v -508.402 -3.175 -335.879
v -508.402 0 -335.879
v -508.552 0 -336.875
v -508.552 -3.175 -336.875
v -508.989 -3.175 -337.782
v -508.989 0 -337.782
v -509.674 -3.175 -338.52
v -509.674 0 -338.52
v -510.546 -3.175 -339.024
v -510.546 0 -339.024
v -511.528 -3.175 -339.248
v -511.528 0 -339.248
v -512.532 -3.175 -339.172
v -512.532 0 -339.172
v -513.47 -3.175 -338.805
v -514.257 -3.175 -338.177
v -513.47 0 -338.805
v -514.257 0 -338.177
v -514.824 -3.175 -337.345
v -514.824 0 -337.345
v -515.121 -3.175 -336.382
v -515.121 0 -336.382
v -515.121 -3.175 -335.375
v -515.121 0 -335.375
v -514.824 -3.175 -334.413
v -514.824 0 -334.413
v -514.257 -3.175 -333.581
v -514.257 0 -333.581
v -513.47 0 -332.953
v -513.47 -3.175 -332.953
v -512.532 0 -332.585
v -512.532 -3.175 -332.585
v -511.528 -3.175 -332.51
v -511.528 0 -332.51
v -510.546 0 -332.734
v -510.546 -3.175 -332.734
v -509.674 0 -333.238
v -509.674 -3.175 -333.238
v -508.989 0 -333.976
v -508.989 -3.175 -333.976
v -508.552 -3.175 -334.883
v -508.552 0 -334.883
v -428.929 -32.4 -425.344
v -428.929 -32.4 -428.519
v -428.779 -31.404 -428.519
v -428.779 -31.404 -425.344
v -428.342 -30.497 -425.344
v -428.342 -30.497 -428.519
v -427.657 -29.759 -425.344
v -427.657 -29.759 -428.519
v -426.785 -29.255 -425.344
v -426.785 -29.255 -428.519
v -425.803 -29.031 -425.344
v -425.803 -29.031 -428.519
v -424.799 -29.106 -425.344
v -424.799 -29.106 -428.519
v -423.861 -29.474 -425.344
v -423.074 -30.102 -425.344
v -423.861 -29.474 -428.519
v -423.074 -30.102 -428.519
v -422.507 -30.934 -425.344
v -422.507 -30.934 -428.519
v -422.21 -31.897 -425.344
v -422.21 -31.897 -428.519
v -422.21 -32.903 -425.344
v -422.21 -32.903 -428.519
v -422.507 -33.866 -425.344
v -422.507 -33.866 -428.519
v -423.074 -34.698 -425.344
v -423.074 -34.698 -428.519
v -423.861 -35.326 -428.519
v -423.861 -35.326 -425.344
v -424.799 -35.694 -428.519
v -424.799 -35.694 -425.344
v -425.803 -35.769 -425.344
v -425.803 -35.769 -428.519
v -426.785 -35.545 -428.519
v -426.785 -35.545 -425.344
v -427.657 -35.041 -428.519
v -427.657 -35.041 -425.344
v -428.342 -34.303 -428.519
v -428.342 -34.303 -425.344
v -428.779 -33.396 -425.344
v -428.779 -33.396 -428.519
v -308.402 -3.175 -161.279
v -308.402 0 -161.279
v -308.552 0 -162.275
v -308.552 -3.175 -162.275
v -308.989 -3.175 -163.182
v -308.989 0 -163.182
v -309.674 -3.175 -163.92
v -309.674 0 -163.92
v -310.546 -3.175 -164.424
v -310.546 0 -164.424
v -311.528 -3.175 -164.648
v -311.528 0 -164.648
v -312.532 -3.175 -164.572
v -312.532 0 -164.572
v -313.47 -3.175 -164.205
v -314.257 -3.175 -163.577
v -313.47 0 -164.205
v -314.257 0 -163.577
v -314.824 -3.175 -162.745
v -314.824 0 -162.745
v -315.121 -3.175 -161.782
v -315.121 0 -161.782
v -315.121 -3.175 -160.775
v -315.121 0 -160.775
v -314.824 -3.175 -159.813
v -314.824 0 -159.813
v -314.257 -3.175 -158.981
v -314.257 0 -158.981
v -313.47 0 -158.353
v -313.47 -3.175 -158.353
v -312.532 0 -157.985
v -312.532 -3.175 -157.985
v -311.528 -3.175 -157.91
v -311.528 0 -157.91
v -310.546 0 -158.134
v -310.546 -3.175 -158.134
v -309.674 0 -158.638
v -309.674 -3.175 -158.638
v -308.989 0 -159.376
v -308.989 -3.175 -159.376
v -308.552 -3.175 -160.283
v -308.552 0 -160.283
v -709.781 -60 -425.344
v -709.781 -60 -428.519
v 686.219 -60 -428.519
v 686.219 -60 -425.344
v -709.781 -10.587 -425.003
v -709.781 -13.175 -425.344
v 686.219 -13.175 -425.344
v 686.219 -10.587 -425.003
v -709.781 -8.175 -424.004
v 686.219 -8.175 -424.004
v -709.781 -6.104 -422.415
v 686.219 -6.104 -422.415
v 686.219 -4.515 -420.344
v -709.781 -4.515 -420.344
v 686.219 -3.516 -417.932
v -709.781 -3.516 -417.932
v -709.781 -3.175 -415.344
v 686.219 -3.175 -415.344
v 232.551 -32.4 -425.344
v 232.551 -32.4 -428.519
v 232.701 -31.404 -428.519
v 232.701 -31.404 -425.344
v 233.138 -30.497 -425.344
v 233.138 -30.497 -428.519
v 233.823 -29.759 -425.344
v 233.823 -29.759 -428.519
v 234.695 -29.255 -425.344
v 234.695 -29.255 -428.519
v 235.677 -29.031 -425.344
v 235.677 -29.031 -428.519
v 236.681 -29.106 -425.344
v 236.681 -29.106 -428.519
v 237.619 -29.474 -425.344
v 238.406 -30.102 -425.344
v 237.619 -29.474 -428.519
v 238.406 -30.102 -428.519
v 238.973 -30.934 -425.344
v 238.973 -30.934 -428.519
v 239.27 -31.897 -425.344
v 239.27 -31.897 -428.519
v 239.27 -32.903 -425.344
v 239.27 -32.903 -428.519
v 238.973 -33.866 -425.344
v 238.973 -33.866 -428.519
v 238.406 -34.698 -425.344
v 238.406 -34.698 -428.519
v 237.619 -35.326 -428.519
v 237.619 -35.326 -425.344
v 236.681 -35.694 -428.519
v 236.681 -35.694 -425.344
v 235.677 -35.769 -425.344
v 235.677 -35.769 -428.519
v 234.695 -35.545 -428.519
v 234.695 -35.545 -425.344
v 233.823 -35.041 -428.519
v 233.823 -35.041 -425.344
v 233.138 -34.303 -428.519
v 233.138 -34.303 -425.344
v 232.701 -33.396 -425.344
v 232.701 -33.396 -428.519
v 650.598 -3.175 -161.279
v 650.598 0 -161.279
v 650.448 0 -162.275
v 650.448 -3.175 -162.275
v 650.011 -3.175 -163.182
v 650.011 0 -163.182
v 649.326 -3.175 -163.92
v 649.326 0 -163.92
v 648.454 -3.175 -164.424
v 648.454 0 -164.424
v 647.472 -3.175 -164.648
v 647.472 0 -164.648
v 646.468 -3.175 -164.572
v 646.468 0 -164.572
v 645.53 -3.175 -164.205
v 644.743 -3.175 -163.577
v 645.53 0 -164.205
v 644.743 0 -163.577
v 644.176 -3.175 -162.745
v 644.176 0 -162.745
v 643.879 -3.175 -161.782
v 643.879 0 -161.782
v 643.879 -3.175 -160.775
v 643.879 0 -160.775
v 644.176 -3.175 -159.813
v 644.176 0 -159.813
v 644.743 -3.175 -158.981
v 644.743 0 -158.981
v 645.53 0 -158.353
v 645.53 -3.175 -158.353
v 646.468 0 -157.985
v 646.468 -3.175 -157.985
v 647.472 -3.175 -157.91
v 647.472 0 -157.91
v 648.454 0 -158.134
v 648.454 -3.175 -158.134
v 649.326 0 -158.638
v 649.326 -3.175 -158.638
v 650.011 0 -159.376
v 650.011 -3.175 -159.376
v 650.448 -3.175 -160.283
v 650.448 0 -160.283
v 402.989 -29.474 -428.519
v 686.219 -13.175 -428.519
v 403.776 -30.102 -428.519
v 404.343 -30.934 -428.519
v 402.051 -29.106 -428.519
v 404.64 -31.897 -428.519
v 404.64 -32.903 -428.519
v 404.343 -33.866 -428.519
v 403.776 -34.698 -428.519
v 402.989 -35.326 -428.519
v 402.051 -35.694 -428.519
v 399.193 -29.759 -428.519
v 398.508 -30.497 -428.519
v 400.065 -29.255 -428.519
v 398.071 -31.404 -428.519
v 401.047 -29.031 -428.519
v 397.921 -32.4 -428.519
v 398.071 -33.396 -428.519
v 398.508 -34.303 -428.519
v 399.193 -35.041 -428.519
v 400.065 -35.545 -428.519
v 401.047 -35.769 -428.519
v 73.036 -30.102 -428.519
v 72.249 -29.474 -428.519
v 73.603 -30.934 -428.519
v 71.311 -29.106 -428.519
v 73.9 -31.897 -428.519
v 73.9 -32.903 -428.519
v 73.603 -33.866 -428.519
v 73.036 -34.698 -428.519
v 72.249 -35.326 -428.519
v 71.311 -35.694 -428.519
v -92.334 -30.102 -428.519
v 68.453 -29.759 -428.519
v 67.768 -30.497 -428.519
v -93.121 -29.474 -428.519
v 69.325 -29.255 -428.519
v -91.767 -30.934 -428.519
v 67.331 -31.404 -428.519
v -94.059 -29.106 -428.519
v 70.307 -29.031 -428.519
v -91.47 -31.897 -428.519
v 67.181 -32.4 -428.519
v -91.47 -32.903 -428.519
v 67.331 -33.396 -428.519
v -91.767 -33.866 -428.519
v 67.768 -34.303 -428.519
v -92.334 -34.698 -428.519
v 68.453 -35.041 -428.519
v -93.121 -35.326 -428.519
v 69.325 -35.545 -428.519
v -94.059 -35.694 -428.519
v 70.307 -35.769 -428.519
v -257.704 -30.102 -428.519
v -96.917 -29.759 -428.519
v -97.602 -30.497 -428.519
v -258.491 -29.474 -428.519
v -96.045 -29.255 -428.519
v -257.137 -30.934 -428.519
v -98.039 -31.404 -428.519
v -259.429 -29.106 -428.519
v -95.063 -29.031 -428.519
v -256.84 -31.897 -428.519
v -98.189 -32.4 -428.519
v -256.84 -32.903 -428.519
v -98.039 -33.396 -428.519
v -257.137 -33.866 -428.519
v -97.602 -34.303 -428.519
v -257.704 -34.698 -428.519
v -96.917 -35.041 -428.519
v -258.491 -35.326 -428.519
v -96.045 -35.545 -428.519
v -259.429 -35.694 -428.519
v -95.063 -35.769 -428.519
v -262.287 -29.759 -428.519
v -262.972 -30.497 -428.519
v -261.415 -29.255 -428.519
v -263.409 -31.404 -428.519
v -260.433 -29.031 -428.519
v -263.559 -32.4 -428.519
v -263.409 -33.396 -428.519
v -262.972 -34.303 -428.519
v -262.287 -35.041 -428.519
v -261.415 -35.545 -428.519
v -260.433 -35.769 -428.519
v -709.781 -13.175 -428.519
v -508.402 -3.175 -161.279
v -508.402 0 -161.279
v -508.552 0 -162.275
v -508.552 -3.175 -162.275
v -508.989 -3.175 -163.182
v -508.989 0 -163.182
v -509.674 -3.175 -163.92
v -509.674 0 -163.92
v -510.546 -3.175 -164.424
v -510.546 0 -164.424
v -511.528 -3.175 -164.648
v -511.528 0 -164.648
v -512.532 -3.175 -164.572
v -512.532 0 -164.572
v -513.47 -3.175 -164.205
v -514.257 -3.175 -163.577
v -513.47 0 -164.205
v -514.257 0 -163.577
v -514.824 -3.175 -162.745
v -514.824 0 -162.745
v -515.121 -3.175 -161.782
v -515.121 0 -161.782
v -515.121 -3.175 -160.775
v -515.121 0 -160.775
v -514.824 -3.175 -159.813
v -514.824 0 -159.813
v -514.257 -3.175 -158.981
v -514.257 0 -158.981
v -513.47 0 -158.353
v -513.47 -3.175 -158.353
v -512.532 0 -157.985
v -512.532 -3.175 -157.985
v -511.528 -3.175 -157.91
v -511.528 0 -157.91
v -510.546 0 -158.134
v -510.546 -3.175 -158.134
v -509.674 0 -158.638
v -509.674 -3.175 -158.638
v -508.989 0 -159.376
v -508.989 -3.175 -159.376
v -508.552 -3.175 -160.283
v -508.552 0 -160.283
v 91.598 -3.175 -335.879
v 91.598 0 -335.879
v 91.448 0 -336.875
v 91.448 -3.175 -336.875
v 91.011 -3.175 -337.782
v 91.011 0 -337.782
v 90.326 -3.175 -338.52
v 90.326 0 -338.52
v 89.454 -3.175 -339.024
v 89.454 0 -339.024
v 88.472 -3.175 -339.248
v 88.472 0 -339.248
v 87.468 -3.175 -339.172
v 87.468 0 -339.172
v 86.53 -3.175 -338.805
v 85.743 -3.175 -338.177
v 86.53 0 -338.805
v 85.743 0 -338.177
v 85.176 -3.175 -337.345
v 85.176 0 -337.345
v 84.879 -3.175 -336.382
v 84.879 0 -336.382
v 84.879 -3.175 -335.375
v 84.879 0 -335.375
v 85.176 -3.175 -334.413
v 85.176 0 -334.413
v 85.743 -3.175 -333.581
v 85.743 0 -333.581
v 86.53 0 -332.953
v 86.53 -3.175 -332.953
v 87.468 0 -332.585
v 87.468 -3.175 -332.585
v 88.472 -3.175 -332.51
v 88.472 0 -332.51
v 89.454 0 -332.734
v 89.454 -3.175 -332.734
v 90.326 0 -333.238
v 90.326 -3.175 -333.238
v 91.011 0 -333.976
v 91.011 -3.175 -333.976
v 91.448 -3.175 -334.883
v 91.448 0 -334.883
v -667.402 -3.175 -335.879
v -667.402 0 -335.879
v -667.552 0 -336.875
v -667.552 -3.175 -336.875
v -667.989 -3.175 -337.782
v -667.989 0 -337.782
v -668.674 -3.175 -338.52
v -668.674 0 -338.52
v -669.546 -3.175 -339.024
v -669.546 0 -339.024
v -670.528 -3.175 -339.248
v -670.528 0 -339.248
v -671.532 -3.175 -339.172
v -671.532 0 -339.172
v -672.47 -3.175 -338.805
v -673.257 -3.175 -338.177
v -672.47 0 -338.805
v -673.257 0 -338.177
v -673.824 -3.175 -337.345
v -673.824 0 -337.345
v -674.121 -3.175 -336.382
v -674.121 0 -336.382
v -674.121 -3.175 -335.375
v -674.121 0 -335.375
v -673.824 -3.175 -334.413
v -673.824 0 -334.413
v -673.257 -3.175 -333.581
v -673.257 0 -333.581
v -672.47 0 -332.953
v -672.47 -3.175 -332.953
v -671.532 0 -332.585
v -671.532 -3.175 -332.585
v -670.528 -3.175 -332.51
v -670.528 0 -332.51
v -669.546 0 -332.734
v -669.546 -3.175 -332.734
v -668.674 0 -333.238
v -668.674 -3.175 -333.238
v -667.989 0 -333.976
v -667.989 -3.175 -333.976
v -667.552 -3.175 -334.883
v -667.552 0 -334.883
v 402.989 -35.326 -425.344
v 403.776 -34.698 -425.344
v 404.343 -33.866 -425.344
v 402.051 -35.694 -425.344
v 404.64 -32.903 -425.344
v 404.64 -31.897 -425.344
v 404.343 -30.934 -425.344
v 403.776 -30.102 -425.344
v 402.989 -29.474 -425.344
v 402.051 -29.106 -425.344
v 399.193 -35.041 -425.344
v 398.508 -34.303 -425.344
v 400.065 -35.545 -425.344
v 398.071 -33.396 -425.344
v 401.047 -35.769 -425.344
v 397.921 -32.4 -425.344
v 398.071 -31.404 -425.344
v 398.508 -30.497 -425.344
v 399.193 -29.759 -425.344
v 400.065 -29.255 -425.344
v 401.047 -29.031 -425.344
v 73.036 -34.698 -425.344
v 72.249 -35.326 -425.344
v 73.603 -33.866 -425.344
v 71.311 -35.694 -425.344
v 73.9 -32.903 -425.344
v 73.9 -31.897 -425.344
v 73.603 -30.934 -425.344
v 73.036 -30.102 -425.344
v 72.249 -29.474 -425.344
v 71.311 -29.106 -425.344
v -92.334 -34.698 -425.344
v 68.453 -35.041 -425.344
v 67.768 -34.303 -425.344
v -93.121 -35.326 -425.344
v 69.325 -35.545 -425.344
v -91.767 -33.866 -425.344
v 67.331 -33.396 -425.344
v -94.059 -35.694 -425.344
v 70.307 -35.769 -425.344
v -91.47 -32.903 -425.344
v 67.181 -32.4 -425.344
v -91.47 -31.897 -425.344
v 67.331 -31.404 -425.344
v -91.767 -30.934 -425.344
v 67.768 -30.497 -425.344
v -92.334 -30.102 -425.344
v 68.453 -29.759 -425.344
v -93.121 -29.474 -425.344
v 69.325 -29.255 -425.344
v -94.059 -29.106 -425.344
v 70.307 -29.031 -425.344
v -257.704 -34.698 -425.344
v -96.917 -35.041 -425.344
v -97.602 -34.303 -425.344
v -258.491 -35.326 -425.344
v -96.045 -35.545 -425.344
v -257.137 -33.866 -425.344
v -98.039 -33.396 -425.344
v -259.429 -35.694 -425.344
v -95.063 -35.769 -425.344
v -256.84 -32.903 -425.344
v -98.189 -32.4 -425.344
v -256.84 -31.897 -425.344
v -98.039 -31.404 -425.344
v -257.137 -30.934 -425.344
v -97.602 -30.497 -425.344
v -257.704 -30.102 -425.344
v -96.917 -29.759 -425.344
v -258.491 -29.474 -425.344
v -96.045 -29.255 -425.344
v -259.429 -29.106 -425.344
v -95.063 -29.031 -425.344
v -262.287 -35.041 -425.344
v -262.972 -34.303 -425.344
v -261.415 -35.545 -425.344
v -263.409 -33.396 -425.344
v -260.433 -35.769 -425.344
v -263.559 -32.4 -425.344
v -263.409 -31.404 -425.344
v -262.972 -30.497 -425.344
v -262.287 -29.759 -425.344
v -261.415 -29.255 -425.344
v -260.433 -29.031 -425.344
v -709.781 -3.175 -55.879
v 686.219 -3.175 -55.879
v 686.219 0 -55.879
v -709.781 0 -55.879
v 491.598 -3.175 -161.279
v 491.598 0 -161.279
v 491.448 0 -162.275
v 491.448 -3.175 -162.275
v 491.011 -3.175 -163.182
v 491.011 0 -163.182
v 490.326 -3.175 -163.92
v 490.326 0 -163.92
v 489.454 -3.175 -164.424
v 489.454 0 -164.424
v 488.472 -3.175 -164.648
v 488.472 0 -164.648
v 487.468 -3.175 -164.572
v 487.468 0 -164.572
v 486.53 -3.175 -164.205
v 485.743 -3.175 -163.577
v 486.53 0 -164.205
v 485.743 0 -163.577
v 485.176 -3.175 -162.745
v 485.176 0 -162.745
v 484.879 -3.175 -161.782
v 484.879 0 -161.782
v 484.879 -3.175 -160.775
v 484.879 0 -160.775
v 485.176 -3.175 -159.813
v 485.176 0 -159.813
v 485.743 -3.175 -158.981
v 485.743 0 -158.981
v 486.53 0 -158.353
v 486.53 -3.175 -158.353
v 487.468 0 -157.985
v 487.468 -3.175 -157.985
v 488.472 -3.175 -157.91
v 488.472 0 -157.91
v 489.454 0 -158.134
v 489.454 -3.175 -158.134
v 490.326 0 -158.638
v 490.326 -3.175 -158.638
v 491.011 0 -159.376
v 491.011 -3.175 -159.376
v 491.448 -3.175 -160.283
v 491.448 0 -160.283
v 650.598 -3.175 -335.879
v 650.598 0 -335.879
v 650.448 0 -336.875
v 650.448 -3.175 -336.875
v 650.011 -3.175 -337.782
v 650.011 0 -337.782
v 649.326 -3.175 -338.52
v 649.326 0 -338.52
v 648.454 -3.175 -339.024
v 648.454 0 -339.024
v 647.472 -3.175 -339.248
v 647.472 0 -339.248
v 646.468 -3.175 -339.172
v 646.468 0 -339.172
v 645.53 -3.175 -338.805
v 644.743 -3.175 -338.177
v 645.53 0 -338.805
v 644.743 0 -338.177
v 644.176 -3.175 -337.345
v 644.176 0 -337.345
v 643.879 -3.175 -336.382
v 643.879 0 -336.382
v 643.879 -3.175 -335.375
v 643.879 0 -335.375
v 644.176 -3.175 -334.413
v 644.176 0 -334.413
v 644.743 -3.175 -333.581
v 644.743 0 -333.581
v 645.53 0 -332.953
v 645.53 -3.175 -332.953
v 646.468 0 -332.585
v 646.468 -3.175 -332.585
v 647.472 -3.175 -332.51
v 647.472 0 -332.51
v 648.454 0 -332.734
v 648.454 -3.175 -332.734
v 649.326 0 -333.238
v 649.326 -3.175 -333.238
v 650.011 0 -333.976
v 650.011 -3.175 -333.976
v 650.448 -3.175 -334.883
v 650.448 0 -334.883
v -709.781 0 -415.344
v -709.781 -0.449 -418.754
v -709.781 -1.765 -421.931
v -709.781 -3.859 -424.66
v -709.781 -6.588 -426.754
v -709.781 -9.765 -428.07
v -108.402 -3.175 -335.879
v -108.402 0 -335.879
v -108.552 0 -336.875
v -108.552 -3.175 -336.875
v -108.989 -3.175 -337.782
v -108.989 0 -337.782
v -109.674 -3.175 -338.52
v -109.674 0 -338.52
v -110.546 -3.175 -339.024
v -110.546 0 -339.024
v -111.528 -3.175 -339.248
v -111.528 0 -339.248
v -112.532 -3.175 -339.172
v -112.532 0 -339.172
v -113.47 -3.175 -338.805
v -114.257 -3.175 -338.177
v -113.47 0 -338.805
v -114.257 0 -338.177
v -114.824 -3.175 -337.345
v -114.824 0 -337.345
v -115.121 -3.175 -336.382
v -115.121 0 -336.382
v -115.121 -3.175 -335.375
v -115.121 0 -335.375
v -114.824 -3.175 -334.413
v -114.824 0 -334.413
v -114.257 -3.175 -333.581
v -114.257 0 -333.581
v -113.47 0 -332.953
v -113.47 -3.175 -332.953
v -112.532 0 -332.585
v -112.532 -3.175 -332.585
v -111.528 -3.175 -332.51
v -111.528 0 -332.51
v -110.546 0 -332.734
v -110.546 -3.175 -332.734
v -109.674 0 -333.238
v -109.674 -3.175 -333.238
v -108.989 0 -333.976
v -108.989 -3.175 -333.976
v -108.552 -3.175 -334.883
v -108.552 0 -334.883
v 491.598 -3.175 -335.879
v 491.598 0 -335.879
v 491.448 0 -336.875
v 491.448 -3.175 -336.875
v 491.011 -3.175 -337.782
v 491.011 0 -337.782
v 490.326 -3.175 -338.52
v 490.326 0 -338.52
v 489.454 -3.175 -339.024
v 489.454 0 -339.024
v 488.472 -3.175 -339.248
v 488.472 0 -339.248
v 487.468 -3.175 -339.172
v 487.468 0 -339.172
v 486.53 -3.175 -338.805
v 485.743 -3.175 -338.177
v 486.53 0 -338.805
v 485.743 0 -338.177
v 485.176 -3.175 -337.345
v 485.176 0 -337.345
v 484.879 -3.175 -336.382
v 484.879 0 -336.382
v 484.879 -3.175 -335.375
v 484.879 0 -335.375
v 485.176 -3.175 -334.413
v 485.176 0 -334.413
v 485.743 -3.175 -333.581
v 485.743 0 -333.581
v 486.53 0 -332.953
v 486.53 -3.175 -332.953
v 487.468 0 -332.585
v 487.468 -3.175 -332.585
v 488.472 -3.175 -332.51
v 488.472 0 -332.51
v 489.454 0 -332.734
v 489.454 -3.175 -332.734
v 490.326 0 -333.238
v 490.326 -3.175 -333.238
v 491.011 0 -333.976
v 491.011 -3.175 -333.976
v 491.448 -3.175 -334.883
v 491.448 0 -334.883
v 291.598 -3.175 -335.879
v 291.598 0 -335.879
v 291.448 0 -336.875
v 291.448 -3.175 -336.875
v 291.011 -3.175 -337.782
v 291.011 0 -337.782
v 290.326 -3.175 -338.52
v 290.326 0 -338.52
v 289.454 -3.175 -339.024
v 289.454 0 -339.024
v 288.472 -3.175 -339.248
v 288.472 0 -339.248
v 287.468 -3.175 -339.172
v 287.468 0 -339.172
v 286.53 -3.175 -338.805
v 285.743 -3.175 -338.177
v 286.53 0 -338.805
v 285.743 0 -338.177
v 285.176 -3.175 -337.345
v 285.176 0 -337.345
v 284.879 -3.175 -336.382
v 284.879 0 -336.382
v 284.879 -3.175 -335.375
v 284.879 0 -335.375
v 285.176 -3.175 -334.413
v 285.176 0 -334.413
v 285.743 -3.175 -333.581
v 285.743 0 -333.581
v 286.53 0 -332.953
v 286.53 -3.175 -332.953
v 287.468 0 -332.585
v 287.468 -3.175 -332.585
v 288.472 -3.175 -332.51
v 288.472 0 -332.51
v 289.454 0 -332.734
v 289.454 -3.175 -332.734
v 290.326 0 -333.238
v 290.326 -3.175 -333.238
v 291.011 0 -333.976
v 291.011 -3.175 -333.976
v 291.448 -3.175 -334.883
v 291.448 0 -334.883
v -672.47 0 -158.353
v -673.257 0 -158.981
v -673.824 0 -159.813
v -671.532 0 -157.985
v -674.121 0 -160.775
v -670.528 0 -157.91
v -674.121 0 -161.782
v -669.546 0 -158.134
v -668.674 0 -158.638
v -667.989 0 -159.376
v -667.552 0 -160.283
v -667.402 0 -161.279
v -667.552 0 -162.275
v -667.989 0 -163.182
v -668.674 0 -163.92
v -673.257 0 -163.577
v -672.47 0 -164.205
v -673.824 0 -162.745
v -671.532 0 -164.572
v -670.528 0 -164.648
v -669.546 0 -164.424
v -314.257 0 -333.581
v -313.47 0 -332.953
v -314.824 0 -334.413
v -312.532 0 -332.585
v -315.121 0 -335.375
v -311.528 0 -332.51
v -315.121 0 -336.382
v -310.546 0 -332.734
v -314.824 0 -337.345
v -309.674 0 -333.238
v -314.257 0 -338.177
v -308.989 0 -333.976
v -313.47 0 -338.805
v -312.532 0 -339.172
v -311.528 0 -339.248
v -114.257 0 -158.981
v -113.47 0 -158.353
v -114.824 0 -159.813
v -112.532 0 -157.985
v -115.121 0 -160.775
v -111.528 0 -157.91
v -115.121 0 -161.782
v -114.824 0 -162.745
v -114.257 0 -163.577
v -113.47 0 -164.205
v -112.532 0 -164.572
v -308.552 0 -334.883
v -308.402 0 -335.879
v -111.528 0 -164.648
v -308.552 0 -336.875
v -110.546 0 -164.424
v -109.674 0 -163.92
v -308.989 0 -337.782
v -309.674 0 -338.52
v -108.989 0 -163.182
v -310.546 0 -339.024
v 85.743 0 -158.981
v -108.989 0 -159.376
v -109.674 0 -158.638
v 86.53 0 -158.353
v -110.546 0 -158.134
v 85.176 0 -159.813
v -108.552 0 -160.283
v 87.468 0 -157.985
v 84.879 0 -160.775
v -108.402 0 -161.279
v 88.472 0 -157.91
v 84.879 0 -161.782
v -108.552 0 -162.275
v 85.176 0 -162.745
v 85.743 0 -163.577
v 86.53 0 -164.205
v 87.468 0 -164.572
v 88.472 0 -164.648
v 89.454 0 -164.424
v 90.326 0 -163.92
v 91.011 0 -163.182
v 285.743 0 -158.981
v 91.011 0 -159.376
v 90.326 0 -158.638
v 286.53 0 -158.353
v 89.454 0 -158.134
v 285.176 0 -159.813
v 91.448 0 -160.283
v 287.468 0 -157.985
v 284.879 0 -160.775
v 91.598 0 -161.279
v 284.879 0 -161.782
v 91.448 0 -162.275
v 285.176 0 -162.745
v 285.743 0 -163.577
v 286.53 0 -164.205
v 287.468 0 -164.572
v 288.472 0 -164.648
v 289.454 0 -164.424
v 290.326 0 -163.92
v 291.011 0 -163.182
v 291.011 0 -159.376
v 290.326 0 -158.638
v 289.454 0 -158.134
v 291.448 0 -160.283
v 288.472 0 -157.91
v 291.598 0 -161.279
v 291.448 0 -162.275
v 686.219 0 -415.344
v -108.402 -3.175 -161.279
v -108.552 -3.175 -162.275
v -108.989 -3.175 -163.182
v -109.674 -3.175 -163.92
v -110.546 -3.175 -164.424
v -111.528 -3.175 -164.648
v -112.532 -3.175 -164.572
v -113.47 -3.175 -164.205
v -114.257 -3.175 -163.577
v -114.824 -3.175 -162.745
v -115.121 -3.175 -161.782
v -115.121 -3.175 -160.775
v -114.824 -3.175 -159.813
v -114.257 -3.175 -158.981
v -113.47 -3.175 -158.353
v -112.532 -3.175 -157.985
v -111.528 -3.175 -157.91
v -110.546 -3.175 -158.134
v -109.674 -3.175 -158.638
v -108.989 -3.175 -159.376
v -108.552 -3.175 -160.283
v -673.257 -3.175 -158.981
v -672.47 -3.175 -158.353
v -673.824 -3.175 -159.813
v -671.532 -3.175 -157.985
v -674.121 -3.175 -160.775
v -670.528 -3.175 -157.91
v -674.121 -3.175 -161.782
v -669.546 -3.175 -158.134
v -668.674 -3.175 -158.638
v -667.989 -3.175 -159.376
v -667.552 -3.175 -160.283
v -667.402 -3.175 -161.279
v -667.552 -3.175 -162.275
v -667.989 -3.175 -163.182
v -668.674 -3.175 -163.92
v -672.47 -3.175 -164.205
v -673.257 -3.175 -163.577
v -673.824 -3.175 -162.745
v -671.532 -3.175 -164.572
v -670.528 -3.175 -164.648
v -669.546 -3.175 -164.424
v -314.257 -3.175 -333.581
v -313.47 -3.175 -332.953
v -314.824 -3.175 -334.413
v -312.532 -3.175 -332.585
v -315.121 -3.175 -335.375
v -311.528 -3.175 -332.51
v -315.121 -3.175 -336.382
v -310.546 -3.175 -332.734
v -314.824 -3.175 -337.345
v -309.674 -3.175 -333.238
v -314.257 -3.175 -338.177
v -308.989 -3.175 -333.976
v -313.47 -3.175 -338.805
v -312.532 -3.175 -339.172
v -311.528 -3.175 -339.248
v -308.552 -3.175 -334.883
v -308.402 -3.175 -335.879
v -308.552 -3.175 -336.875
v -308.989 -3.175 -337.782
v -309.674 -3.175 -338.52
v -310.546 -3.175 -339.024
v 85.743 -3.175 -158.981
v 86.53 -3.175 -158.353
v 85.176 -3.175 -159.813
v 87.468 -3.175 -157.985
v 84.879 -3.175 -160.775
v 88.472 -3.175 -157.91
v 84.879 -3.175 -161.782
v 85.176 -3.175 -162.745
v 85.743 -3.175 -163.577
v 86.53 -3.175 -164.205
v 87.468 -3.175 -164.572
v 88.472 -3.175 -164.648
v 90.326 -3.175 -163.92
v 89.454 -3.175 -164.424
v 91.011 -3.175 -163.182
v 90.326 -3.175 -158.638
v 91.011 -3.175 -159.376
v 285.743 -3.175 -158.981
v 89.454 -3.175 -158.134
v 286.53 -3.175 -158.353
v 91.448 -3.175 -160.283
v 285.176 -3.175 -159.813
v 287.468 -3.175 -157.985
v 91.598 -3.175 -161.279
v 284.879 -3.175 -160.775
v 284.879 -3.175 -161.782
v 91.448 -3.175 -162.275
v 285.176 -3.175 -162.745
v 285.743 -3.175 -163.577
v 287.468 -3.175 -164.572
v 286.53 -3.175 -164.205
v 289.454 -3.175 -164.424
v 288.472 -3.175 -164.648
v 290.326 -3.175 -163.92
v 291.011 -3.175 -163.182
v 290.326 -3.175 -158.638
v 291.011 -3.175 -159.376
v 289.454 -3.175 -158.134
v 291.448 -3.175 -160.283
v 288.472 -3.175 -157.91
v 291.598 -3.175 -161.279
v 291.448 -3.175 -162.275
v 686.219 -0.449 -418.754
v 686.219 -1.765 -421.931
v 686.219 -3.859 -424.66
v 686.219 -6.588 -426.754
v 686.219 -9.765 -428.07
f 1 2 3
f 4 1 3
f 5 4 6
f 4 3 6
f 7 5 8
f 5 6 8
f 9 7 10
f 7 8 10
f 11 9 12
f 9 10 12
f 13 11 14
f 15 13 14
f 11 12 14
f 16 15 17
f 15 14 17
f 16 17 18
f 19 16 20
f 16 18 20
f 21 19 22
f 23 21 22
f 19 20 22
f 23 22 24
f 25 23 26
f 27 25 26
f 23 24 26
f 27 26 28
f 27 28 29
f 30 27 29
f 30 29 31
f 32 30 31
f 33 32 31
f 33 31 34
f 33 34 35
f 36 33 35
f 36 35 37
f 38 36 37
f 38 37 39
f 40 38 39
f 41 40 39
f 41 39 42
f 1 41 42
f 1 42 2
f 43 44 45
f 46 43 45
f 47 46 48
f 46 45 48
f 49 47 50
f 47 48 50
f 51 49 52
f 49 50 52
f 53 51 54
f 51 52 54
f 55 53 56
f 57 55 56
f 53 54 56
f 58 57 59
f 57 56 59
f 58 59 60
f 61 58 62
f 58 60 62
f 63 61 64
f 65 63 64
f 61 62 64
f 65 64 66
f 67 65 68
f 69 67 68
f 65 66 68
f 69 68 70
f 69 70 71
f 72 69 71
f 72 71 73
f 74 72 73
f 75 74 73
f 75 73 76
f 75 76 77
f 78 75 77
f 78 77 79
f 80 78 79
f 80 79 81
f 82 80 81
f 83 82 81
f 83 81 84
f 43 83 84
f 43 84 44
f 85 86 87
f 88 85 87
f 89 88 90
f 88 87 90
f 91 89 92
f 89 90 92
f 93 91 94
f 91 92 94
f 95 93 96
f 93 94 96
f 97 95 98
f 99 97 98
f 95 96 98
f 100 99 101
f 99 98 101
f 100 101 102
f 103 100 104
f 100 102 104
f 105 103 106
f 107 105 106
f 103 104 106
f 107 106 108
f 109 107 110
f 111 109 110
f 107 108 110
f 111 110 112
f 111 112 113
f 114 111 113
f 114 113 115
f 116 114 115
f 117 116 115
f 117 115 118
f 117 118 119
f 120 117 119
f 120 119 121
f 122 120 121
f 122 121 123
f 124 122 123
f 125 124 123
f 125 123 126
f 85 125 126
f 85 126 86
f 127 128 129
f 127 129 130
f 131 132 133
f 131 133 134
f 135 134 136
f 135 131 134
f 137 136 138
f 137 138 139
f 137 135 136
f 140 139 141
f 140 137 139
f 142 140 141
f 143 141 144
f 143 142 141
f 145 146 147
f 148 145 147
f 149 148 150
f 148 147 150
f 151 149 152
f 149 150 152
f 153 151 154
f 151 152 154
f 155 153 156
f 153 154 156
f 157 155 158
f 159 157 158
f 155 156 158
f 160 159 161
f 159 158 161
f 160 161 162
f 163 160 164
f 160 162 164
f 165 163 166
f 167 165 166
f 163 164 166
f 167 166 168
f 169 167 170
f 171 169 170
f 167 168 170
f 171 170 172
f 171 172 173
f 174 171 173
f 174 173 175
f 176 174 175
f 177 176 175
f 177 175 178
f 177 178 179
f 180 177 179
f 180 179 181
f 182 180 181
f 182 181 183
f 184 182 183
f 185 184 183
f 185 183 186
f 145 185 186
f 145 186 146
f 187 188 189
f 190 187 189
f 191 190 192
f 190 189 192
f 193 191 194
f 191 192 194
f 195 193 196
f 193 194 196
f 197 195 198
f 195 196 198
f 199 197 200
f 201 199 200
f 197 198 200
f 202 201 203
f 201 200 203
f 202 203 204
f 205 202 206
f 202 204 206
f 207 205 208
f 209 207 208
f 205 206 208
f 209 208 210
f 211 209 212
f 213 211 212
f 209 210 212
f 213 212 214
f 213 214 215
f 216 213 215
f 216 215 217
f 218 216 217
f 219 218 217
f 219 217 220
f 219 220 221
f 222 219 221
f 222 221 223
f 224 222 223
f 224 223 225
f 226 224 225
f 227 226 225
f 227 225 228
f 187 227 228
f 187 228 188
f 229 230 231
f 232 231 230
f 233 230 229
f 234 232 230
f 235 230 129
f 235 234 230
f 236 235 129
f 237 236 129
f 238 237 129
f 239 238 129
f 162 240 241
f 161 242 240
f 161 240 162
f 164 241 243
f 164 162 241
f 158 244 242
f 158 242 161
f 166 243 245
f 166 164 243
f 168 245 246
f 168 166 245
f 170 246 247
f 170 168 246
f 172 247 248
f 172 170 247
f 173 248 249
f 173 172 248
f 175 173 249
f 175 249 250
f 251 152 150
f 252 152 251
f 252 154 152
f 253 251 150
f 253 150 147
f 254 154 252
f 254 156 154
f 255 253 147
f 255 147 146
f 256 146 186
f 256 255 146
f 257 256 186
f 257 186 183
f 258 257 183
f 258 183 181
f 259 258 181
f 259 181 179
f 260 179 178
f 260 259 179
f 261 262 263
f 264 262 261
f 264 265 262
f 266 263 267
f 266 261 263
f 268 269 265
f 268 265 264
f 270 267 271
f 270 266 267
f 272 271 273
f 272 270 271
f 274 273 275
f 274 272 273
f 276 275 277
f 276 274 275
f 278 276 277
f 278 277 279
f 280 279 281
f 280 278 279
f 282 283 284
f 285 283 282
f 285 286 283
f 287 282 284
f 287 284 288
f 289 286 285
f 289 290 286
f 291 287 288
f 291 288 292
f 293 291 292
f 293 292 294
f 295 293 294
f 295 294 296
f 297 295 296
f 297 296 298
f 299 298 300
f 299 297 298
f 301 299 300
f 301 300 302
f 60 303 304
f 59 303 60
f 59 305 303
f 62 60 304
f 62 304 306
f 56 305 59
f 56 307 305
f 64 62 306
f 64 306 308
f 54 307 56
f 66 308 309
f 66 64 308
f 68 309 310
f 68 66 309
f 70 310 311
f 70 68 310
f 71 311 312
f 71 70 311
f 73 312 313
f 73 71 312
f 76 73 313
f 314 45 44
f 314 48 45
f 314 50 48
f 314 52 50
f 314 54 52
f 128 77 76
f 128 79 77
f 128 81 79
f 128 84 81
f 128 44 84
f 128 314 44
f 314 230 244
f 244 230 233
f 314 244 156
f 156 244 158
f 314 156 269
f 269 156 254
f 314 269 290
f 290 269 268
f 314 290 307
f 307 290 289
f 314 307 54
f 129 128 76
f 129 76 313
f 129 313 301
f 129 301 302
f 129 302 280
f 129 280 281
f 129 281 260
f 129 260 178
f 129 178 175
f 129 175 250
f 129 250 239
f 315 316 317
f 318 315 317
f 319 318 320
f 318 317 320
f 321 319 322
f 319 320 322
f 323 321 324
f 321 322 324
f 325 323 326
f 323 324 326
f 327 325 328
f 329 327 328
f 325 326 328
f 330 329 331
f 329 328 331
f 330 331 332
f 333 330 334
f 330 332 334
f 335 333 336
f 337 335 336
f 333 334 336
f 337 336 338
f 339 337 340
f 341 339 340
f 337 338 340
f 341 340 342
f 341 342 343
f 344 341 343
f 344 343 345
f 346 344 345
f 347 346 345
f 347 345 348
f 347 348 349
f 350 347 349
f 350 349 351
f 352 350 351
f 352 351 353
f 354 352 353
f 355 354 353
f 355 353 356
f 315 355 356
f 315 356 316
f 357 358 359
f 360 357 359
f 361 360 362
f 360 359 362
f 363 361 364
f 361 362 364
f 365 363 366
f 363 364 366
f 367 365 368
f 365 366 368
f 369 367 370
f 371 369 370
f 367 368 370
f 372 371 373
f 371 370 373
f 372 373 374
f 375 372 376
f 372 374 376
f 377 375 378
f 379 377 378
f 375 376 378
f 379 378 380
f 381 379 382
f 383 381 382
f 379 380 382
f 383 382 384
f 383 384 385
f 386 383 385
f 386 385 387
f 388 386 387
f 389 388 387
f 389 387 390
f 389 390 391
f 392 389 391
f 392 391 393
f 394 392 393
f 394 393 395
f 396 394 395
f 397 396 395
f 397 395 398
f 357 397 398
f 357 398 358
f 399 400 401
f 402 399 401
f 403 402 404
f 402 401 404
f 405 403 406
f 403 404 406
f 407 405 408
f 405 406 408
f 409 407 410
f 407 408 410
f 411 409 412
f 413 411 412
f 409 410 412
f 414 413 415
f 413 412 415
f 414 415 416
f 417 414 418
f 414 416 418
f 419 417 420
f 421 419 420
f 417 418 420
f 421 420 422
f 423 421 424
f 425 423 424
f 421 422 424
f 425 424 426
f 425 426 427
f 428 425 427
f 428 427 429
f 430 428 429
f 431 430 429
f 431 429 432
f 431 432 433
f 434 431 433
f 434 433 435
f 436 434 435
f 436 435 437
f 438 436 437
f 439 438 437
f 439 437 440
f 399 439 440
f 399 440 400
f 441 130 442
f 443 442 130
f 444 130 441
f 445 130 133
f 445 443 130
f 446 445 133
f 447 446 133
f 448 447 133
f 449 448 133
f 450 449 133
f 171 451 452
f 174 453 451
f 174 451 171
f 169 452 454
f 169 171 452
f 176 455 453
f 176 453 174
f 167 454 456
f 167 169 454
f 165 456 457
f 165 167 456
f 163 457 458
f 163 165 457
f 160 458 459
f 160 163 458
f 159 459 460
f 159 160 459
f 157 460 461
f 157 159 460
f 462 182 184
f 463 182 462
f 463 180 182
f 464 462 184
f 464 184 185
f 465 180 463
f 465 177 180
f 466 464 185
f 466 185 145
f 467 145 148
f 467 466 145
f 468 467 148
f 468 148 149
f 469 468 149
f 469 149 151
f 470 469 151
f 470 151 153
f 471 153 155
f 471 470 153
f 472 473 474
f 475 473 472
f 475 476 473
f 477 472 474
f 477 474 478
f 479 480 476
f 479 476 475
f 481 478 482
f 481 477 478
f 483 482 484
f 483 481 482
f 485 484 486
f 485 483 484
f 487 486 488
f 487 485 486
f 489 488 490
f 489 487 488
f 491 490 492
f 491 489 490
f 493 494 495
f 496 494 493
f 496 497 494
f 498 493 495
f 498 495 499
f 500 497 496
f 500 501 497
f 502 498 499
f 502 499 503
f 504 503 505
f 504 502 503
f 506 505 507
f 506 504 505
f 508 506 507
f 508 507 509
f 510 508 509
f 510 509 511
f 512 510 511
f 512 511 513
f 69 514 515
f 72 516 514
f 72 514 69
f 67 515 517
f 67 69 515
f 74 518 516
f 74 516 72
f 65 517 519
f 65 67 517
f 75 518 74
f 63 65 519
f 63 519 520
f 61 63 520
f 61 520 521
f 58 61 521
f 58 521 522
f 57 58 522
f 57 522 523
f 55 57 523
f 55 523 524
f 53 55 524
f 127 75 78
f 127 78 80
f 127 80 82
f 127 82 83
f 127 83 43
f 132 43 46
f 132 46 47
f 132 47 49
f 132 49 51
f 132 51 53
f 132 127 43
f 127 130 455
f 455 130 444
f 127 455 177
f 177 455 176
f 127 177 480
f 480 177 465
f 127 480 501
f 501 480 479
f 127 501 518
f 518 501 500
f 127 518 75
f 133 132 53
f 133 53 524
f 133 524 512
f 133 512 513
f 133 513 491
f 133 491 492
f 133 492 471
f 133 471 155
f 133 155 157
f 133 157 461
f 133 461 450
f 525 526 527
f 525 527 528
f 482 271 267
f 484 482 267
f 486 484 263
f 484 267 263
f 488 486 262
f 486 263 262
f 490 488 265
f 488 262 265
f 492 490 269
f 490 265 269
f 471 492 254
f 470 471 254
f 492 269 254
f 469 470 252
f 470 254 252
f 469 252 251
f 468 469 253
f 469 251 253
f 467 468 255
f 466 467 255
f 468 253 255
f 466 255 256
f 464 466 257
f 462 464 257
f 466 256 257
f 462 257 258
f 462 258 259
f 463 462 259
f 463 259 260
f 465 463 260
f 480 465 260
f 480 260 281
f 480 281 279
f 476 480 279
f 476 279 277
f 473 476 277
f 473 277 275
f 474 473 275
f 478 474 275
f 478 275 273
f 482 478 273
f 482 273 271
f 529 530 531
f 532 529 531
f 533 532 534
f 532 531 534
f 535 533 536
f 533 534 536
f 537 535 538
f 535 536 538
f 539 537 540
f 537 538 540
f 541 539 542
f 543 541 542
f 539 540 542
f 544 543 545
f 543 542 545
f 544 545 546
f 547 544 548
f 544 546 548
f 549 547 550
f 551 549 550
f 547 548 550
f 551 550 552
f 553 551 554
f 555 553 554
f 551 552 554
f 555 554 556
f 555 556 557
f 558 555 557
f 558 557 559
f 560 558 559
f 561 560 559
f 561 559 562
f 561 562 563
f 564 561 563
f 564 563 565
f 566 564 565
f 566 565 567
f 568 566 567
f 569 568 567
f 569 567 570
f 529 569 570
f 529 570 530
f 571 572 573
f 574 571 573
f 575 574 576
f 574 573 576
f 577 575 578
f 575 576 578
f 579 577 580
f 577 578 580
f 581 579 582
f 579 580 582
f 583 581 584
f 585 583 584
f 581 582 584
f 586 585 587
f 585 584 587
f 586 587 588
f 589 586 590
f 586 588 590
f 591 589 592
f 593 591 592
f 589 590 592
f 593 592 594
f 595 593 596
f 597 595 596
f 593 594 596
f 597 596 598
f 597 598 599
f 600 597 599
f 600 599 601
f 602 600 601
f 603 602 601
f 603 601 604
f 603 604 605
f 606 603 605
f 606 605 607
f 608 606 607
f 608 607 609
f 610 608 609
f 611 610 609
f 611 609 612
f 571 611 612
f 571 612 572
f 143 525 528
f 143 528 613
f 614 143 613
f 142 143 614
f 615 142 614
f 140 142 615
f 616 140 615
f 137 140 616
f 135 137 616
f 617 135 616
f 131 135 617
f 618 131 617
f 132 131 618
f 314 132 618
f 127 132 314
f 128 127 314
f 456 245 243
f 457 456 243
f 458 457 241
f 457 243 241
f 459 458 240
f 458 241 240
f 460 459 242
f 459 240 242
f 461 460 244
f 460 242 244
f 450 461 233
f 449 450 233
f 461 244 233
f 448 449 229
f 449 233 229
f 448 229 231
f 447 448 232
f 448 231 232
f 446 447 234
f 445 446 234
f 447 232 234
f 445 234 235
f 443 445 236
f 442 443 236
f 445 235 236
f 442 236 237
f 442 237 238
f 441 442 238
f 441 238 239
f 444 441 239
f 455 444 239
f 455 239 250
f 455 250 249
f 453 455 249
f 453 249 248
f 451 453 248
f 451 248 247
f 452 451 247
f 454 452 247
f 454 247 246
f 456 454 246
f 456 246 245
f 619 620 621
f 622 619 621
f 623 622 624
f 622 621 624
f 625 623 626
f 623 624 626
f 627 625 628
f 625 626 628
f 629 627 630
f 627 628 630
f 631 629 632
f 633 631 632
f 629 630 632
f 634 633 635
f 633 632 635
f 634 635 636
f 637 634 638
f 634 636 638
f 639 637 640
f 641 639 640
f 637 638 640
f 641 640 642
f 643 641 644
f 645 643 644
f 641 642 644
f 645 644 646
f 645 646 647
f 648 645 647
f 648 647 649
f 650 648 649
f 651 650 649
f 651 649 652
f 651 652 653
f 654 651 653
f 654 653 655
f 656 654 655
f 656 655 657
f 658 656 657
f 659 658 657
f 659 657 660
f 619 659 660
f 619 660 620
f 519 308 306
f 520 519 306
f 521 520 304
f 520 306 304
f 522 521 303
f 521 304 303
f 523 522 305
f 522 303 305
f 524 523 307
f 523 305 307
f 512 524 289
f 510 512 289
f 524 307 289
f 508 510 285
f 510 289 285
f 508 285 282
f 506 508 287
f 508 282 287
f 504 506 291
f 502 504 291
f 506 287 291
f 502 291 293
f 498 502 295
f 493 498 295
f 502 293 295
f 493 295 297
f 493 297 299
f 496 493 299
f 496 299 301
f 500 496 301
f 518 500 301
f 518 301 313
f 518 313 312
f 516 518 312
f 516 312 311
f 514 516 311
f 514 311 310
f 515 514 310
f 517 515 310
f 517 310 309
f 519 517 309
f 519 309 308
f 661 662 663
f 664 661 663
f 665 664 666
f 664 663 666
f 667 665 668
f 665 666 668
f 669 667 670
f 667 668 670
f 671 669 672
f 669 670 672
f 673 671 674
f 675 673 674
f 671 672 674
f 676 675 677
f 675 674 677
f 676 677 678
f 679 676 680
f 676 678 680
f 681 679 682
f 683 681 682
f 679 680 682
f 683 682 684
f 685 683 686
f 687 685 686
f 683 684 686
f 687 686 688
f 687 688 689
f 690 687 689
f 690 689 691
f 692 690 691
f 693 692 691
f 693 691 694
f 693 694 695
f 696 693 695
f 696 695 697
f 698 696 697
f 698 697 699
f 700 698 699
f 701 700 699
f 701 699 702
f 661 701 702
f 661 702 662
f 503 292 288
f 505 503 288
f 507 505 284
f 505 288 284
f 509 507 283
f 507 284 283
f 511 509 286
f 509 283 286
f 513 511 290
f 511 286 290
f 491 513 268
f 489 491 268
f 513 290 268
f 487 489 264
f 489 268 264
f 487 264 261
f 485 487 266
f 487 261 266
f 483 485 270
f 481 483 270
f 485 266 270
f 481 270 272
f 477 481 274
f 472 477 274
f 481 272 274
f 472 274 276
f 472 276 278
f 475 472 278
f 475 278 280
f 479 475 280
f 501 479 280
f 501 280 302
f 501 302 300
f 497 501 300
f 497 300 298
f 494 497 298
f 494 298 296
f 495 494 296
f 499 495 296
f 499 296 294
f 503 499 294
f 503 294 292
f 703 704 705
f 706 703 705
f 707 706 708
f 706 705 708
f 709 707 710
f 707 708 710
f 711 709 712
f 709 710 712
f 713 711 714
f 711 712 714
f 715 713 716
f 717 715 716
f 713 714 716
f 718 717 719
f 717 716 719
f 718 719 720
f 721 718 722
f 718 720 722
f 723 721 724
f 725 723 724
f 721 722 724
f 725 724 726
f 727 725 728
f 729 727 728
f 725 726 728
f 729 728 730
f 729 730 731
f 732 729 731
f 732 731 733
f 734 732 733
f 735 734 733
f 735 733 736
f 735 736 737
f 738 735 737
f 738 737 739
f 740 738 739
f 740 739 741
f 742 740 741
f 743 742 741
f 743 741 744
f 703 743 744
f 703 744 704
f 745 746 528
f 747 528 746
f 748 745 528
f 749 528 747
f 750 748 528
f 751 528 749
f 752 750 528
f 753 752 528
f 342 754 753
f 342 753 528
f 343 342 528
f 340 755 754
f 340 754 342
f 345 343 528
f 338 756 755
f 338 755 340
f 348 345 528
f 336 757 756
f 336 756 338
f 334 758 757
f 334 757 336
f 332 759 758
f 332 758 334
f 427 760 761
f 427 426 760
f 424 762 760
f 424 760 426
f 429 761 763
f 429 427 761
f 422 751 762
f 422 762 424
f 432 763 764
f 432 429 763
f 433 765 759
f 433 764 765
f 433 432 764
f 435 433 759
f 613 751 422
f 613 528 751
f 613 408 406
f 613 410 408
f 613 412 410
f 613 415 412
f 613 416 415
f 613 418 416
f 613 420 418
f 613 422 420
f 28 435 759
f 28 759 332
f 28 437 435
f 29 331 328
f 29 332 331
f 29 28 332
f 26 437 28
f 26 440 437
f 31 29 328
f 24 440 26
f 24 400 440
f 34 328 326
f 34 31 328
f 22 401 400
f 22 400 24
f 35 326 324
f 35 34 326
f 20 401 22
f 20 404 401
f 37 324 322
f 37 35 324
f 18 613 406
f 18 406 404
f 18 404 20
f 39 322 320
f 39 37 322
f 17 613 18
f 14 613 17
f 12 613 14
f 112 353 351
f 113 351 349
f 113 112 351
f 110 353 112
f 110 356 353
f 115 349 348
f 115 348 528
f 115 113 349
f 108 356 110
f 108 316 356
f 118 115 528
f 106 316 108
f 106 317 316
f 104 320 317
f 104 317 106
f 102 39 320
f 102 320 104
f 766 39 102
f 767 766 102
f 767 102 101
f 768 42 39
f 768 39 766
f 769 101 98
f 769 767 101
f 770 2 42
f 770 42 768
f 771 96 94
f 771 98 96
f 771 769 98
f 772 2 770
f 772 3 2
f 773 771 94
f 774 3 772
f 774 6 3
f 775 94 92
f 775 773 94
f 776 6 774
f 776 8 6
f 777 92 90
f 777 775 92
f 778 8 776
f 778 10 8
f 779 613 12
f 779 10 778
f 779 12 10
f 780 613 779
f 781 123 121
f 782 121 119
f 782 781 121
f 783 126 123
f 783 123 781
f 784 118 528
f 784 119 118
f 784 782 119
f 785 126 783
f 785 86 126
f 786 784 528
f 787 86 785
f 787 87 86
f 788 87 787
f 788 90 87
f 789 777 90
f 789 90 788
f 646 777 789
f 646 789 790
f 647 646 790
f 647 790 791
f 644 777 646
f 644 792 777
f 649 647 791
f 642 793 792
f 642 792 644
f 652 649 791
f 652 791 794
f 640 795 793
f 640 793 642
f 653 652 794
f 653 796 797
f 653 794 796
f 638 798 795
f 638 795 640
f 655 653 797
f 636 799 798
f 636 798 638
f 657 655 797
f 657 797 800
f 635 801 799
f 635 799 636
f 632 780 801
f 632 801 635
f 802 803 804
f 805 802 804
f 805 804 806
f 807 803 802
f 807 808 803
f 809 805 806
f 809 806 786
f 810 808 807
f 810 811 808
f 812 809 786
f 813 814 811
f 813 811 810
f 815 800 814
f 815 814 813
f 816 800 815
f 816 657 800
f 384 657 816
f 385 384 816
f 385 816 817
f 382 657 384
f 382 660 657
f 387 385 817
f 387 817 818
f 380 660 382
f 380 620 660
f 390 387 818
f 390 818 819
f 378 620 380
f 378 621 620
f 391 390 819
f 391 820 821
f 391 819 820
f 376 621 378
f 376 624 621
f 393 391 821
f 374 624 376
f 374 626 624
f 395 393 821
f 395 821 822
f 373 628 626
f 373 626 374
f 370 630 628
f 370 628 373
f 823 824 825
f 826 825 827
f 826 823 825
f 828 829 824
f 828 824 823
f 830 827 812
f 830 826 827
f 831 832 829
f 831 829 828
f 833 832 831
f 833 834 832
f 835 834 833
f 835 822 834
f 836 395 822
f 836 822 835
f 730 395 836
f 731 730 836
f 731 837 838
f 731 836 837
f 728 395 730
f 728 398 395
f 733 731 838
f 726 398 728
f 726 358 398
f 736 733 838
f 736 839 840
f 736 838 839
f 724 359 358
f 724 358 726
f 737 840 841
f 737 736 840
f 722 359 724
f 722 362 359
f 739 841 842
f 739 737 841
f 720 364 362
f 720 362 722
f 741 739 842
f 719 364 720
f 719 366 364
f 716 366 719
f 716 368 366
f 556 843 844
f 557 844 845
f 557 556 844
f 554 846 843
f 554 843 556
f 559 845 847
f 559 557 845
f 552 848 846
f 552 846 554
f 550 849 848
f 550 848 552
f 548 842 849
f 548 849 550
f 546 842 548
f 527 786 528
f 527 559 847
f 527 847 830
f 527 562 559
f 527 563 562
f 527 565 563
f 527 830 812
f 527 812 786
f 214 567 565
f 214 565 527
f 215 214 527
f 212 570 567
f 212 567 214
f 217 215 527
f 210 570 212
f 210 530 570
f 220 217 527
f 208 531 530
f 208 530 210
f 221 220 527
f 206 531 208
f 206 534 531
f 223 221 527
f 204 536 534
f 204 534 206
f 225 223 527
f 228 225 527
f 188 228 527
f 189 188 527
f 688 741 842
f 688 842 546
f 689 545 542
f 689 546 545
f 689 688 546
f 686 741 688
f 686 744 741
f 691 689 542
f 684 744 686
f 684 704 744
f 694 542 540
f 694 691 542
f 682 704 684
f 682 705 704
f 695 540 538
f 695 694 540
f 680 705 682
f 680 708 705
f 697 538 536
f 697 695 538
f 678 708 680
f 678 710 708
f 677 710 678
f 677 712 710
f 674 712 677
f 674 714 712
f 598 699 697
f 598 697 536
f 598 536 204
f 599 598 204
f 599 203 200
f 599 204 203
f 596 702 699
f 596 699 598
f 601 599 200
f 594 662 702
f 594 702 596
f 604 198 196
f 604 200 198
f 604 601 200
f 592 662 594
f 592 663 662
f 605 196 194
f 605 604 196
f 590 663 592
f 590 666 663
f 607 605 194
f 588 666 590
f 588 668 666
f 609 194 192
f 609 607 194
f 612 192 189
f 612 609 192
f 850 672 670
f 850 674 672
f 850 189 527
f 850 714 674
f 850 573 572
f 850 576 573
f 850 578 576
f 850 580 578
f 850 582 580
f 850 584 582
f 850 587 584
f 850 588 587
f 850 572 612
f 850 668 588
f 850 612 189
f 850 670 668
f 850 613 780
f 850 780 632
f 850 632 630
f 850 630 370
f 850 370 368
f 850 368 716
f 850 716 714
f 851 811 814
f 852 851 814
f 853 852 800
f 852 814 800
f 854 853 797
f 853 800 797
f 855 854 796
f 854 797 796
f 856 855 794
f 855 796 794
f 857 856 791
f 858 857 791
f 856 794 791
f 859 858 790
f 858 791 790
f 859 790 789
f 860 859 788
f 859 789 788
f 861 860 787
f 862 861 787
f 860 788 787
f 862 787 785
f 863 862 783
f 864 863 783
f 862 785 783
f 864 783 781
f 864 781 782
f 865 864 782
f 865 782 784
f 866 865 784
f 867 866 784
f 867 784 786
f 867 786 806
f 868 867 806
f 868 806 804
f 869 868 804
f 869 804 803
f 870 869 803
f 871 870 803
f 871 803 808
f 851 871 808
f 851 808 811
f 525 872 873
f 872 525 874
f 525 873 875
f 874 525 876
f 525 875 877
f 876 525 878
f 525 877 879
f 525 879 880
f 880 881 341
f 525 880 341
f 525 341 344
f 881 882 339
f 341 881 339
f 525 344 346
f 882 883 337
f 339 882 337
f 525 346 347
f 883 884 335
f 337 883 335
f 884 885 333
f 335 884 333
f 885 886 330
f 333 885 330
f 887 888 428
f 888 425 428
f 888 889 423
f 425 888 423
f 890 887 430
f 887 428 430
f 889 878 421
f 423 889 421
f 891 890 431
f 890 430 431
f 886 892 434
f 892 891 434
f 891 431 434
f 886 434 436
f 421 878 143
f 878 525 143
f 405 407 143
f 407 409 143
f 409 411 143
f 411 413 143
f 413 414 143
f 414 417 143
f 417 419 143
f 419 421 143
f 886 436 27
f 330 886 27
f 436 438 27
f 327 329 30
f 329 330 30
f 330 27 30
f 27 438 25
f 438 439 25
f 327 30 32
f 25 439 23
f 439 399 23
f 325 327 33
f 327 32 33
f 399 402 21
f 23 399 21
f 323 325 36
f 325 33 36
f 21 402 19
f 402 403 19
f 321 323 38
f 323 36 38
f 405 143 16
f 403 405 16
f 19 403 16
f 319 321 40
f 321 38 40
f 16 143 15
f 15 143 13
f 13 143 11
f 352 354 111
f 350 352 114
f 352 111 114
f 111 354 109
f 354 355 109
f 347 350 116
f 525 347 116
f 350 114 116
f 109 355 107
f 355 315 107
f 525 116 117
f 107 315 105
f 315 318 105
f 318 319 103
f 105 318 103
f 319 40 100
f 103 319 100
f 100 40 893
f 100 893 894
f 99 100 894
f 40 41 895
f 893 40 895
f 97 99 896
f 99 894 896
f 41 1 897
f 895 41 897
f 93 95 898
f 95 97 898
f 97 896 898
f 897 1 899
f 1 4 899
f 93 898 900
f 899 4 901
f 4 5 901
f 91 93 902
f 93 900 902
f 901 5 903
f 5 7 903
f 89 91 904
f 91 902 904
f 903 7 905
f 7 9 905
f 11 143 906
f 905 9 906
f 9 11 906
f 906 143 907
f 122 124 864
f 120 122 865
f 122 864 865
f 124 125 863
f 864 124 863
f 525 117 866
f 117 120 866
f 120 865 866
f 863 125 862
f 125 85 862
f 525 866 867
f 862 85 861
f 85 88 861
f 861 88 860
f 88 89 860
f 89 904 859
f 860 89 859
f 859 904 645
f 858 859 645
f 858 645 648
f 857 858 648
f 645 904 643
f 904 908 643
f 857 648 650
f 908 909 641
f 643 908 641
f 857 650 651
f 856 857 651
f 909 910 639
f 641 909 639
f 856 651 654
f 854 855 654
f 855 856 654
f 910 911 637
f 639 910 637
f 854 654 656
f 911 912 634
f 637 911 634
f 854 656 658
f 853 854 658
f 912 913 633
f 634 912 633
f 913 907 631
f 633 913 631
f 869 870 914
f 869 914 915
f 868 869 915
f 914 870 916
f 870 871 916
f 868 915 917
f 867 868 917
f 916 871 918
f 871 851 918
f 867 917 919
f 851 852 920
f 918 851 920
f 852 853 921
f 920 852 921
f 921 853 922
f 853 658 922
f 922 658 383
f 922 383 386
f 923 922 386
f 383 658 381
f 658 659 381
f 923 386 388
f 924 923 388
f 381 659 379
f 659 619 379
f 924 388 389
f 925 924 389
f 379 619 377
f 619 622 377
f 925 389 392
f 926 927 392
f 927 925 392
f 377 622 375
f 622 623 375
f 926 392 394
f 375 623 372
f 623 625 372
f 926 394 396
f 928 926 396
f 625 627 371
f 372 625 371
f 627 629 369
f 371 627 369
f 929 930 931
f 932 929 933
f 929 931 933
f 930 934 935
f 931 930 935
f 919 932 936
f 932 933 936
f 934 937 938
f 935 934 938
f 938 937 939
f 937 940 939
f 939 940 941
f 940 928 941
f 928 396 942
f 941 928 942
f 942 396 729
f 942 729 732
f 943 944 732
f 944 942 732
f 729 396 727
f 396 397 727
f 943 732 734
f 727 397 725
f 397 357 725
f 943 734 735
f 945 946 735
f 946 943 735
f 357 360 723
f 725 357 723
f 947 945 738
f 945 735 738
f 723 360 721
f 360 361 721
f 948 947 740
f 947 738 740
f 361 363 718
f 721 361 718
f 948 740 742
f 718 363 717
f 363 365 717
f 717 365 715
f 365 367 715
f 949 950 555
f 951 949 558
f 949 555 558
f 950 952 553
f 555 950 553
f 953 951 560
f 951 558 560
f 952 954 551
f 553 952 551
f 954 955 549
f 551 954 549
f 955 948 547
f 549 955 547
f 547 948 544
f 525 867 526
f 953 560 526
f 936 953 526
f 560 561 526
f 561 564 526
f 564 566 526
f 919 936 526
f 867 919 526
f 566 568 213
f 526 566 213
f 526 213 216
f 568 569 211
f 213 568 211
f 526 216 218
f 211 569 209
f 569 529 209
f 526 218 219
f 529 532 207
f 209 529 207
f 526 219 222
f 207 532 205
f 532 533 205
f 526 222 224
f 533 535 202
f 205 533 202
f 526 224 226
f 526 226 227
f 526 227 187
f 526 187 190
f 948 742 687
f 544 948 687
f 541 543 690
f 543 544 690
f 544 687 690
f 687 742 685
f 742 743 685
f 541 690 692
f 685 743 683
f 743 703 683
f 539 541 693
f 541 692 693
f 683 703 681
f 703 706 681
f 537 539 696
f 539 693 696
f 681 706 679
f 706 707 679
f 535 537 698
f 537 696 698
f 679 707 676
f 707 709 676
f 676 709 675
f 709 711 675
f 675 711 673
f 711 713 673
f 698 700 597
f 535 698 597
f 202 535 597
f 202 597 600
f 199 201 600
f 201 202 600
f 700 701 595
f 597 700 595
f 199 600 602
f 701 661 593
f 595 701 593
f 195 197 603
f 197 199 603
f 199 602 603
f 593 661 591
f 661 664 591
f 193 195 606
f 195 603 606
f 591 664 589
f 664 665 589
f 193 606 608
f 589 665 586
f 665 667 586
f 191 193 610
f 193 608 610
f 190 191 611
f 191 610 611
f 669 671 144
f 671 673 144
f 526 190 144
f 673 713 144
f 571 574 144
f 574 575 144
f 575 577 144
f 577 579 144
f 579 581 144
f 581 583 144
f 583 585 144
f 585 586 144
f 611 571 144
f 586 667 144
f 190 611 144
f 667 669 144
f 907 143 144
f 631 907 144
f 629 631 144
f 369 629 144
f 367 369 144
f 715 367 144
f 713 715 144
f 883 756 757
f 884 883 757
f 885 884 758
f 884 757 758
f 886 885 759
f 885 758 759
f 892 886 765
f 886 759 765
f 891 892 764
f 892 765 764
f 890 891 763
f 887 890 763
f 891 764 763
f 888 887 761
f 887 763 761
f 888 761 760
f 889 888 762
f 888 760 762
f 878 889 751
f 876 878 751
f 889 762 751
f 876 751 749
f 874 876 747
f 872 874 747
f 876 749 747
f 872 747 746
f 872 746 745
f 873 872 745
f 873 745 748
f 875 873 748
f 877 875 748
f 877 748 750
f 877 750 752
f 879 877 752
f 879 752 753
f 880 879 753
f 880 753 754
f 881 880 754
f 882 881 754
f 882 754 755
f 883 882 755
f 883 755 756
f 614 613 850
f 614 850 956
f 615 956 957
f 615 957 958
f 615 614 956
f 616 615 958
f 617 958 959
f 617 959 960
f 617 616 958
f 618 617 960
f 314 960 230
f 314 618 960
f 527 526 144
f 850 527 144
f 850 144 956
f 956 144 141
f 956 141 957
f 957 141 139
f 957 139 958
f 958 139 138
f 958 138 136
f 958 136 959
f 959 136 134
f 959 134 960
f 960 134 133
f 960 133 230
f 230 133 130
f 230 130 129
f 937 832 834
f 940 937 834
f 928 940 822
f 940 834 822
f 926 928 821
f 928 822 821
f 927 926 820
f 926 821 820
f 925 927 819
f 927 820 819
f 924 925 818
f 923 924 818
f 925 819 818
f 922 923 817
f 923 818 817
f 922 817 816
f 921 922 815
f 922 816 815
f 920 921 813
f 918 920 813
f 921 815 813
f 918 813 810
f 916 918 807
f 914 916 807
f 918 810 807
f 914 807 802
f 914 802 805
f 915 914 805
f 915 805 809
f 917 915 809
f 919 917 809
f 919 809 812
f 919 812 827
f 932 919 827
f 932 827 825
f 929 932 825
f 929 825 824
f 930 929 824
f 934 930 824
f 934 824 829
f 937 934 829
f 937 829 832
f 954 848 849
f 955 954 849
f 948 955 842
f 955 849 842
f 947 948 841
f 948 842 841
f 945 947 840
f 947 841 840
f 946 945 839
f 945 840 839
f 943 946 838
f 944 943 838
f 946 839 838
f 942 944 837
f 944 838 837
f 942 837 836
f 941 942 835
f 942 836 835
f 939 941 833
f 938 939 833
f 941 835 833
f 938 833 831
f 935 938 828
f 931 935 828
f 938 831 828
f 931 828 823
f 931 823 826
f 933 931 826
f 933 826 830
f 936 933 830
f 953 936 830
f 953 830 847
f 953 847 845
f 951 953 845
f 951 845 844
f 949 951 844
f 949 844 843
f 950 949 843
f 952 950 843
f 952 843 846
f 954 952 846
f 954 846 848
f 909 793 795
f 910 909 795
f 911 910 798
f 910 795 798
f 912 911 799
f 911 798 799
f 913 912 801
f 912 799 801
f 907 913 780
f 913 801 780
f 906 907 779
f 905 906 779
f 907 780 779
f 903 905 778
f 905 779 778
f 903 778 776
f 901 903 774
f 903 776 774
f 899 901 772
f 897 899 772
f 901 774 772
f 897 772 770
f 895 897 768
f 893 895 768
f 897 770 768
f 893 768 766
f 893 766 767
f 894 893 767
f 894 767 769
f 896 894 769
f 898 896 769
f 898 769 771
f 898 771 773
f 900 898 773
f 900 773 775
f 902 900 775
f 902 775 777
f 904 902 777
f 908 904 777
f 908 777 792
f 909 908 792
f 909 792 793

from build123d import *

# Parameters (mm, degrees)
CROQUIS1_W                       = 1396
CROQUIS1_H                       = 392.64
BRIDA_BASE1_DEPTH                = 3.175
TALADRO_DE_MARGEN_PARA_1_41_D    = 6.7564
BRIDA_DE_ARISTA1_STRIP_W         = 32.7
BRIDA_DE_ARISTA1_STRIP_H         = 3.175
BRIDA_DE_ARISTA1_STRIP_CUT_DEPTH = 1396
BRIDA_DE_ARISTA1_DEPTH           = 1396
TALADRO_DE_MARGEN_PARA_1_42_D    = 6.7564
CROQUIS9_W                       = 1396
CROQUIS9_H                       = 20
CORTAR_EXTRUIR1_DEPTH            = 10


# Sheet-metal steps are written as plain solids
with BuildPart() as part:
    # Croquis1 → Brida base1 (new body)
    with BuildSketch(Plane(origin=(0, 0, 0), x_dir=(1, 0, 0), z_dir=(0, 1, 0))):
        with Locations((-11.780590717, 232.198987342)):
            Rectangle(CROQUIS1_W, CROQUIS1_H)
    extrude(amount=-BRIDA_BASE1_DEPTH)

    # Taladro de margen para 1/41 (through all)
    with Locations(Plane(origin=(0, -3.175, 0), x_dir=(-1, 0, 0), z_dir=(0, -1, 0))):
        with Locations((511.780590717, 161.278987342), (511.780590717, 335.878987342), (311.780590717, 161.278987342), (311.780590717, 335.878987342), (111.780590717, 161.278987342), (111.780590717, 335.878987342), (-88.219409283, 161.278987342), (-88.219409283, 335.878987342), (-288.219409283, 161.278987342), (-288.219409283, 335.878987342), (-488.219409283, 161.278987342), (-488.219409283, 335.878987342), (670.780590717, 161.278987342), (670.780590717, 335.878987342), (-647.219409283, 161.278987342), (-647.219409283, 335.878987342)):
            Hole(TALADRO_DE_MARGEN_PARA_1_41_D / 2)

    # Brida de arista1 strip (across the edge) → Brida de arista1 strip cut (cut)
    with BuildSketch(Plane(origin=(-709.780590717, -3.175, -428.518987342), x_dir=(0, 0, 1), z_dir=(1, 0, 0))):
        with Locations((-3.175, -1.5875)):
            Rectangle(BRIDA_DE_ARISTA1_STRIP_W, BRIDA_DE_ARISTA1_STRIP_H)
    extrude(amount=BRIDA_DE_ARISTA1_STRIP_CUT_DEPTH, mode=Mode.SUBTRACT)

    # Brida de arista1 section (across the edge) → Brida de arista1 (add)
    with BuildSketch(Plane(origin=(-709.780590717, -3.175, -428.518987342), x_dir=(0, 0, 1), z_dir=(1, 0, 0))):
        with BuildLine():
            Line((0, 10), (0, 56.825))
            Line((0, 56.825), (3.175, 56.825))
            Line((3.175, 56.825), (3.175, 10))
            ThreePointArc((3.175, 10), (6.103932188, 2.928932188), (13.175, 0))
            Line((13.175, 0), (13.175, -3.175))
            ThreePointArc((13.175, -3.175), (3.858868158, 0.683868158), (0, 10))
        make_face()
    extrude(amount=BRIDA_DE_ARISTA1_DEPTH)

    # Taladro de margen para 1/42 (through all)
    with Locations(Plane.XY.offset(-425.343987342)):
        with Locations((-425.550590717, -32.4), (-260.180590717, -32.4), (-94.810590717, -32.4), (70.559409283, -32.4), (235.929409283, -32.4), (401.299409283, -32.4)):
            Hole(TALADRO_DE_MARGEN_PARA_1_42_D / 2)

    # Croquis9 → Cortar-Extruir1 (cut)
    with BuildSketch(Plane(origin=(0, -3.175, 0), x_dir=(-1, 0, 0), z_dir=(0, -1, 0))):
        with Locations((11.780590717, 45.878987342)):
            Rectangle(CROQUIS9_W, CROQUIS9_H)
    extrude(amount=-CORTAR_EXTRUIR1_DEPTH, mode=Mode.SUBTRACT)


solid = part.part
